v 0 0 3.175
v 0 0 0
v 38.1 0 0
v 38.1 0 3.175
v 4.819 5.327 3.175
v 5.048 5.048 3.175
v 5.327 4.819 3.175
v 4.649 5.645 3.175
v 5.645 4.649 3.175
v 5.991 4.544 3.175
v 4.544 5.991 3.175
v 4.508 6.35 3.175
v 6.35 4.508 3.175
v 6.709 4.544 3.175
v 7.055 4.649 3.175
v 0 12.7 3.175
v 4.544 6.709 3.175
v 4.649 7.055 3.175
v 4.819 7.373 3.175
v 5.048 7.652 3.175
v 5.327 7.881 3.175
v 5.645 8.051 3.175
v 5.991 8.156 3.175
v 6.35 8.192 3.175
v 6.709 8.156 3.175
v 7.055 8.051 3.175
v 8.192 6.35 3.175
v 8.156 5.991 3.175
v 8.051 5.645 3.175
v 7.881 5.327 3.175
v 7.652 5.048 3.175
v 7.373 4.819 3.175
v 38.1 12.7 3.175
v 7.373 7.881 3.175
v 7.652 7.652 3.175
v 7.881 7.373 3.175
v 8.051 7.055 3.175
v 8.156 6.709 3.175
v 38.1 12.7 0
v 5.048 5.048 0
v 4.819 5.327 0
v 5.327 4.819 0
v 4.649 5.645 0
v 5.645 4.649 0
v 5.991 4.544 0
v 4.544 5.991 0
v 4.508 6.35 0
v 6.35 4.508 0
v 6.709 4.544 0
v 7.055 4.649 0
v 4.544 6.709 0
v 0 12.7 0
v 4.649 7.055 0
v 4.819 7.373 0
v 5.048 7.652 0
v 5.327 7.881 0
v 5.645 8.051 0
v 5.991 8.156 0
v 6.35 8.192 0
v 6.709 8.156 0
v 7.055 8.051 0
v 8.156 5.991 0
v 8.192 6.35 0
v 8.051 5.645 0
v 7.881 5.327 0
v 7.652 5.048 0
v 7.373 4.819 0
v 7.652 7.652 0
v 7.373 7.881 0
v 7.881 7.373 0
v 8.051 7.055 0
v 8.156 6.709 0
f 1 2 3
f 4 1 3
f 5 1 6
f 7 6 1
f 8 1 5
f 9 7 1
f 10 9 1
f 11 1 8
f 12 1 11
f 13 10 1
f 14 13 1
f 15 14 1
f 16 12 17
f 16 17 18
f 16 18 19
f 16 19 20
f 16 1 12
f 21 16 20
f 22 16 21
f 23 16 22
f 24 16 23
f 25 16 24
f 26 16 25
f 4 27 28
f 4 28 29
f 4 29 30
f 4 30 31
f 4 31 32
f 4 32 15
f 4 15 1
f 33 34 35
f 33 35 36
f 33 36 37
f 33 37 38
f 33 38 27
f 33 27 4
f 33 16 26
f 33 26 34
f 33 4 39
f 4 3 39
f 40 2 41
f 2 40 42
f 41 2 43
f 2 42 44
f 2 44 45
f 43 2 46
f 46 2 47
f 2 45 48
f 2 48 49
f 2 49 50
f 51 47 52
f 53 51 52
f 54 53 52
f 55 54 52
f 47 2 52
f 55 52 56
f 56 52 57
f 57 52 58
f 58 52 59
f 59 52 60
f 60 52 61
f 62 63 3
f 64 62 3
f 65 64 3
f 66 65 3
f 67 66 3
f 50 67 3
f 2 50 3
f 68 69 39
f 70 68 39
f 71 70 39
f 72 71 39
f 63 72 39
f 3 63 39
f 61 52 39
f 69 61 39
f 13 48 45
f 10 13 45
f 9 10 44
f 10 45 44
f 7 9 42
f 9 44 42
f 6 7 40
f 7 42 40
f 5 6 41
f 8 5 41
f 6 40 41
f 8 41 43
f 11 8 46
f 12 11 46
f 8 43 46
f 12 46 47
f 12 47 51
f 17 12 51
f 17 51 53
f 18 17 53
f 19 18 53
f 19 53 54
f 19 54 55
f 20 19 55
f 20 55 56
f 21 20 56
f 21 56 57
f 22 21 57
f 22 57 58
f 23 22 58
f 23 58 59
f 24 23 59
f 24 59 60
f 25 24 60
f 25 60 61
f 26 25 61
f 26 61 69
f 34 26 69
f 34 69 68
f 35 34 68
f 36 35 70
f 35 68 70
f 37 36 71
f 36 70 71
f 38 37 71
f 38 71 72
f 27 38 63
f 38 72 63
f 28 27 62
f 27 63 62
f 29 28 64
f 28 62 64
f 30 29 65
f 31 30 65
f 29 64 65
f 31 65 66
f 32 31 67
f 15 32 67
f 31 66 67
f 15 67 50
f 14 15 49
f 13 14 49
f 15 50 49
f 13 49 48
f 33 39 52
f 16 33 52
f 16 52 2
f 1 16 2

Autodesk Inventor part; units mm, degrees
ref_plane "YZ Plane" through (0, 0, 0) normal (1, 0, 0) x (0, 1, 0)
ref_plane "XZ Plane" through (0, 0, 0) normal (0, 1, 0) x (-1, 0, 0)
ref_plane "XY Plane" through (0, 0, 0) normal (0, 0, 1) x (1, 0, 0)
sketch "Sketch1" plane through (0, 0, 0) normal (0, 0, 1) x (1, 0, 0)
  line L0 (0, 0) -> (38.1, 0)
  line L1 (38.1, 0) -> (38.1, 12.7)
  line L2 (38.1, 12.7) -> (0, 12.7)
  line L3 (0, 12.7) -> (0, 0)
  dimension "d0" = 38.1
  dimension "d1" = 12.7
extrude "Extrusion1" add sketch "Sketch1" along normal blind 3.175
sketch "Sketch2" plane through (0, 0, 3.175) normal (0, 0, 1) x (1, 0, 0)
  line L0 (38.1, 12.7) -> (0, 12.7) projected
  line L1 (0, 12.7) -> (0, 0) projected
  point P0 (6.35, 6.35)
  dimension "d4" = 6.35
  dimension "d5" = 6.35
hole "Hole1" at (6.35, 6.35, 3.175) direction (0, 0, -1) diameter 3.683 end through all thread size "10-24 UNC" class "2B" standard "ANSI Unified Screw Threads"
properties part number "RollerSquareBracket"
